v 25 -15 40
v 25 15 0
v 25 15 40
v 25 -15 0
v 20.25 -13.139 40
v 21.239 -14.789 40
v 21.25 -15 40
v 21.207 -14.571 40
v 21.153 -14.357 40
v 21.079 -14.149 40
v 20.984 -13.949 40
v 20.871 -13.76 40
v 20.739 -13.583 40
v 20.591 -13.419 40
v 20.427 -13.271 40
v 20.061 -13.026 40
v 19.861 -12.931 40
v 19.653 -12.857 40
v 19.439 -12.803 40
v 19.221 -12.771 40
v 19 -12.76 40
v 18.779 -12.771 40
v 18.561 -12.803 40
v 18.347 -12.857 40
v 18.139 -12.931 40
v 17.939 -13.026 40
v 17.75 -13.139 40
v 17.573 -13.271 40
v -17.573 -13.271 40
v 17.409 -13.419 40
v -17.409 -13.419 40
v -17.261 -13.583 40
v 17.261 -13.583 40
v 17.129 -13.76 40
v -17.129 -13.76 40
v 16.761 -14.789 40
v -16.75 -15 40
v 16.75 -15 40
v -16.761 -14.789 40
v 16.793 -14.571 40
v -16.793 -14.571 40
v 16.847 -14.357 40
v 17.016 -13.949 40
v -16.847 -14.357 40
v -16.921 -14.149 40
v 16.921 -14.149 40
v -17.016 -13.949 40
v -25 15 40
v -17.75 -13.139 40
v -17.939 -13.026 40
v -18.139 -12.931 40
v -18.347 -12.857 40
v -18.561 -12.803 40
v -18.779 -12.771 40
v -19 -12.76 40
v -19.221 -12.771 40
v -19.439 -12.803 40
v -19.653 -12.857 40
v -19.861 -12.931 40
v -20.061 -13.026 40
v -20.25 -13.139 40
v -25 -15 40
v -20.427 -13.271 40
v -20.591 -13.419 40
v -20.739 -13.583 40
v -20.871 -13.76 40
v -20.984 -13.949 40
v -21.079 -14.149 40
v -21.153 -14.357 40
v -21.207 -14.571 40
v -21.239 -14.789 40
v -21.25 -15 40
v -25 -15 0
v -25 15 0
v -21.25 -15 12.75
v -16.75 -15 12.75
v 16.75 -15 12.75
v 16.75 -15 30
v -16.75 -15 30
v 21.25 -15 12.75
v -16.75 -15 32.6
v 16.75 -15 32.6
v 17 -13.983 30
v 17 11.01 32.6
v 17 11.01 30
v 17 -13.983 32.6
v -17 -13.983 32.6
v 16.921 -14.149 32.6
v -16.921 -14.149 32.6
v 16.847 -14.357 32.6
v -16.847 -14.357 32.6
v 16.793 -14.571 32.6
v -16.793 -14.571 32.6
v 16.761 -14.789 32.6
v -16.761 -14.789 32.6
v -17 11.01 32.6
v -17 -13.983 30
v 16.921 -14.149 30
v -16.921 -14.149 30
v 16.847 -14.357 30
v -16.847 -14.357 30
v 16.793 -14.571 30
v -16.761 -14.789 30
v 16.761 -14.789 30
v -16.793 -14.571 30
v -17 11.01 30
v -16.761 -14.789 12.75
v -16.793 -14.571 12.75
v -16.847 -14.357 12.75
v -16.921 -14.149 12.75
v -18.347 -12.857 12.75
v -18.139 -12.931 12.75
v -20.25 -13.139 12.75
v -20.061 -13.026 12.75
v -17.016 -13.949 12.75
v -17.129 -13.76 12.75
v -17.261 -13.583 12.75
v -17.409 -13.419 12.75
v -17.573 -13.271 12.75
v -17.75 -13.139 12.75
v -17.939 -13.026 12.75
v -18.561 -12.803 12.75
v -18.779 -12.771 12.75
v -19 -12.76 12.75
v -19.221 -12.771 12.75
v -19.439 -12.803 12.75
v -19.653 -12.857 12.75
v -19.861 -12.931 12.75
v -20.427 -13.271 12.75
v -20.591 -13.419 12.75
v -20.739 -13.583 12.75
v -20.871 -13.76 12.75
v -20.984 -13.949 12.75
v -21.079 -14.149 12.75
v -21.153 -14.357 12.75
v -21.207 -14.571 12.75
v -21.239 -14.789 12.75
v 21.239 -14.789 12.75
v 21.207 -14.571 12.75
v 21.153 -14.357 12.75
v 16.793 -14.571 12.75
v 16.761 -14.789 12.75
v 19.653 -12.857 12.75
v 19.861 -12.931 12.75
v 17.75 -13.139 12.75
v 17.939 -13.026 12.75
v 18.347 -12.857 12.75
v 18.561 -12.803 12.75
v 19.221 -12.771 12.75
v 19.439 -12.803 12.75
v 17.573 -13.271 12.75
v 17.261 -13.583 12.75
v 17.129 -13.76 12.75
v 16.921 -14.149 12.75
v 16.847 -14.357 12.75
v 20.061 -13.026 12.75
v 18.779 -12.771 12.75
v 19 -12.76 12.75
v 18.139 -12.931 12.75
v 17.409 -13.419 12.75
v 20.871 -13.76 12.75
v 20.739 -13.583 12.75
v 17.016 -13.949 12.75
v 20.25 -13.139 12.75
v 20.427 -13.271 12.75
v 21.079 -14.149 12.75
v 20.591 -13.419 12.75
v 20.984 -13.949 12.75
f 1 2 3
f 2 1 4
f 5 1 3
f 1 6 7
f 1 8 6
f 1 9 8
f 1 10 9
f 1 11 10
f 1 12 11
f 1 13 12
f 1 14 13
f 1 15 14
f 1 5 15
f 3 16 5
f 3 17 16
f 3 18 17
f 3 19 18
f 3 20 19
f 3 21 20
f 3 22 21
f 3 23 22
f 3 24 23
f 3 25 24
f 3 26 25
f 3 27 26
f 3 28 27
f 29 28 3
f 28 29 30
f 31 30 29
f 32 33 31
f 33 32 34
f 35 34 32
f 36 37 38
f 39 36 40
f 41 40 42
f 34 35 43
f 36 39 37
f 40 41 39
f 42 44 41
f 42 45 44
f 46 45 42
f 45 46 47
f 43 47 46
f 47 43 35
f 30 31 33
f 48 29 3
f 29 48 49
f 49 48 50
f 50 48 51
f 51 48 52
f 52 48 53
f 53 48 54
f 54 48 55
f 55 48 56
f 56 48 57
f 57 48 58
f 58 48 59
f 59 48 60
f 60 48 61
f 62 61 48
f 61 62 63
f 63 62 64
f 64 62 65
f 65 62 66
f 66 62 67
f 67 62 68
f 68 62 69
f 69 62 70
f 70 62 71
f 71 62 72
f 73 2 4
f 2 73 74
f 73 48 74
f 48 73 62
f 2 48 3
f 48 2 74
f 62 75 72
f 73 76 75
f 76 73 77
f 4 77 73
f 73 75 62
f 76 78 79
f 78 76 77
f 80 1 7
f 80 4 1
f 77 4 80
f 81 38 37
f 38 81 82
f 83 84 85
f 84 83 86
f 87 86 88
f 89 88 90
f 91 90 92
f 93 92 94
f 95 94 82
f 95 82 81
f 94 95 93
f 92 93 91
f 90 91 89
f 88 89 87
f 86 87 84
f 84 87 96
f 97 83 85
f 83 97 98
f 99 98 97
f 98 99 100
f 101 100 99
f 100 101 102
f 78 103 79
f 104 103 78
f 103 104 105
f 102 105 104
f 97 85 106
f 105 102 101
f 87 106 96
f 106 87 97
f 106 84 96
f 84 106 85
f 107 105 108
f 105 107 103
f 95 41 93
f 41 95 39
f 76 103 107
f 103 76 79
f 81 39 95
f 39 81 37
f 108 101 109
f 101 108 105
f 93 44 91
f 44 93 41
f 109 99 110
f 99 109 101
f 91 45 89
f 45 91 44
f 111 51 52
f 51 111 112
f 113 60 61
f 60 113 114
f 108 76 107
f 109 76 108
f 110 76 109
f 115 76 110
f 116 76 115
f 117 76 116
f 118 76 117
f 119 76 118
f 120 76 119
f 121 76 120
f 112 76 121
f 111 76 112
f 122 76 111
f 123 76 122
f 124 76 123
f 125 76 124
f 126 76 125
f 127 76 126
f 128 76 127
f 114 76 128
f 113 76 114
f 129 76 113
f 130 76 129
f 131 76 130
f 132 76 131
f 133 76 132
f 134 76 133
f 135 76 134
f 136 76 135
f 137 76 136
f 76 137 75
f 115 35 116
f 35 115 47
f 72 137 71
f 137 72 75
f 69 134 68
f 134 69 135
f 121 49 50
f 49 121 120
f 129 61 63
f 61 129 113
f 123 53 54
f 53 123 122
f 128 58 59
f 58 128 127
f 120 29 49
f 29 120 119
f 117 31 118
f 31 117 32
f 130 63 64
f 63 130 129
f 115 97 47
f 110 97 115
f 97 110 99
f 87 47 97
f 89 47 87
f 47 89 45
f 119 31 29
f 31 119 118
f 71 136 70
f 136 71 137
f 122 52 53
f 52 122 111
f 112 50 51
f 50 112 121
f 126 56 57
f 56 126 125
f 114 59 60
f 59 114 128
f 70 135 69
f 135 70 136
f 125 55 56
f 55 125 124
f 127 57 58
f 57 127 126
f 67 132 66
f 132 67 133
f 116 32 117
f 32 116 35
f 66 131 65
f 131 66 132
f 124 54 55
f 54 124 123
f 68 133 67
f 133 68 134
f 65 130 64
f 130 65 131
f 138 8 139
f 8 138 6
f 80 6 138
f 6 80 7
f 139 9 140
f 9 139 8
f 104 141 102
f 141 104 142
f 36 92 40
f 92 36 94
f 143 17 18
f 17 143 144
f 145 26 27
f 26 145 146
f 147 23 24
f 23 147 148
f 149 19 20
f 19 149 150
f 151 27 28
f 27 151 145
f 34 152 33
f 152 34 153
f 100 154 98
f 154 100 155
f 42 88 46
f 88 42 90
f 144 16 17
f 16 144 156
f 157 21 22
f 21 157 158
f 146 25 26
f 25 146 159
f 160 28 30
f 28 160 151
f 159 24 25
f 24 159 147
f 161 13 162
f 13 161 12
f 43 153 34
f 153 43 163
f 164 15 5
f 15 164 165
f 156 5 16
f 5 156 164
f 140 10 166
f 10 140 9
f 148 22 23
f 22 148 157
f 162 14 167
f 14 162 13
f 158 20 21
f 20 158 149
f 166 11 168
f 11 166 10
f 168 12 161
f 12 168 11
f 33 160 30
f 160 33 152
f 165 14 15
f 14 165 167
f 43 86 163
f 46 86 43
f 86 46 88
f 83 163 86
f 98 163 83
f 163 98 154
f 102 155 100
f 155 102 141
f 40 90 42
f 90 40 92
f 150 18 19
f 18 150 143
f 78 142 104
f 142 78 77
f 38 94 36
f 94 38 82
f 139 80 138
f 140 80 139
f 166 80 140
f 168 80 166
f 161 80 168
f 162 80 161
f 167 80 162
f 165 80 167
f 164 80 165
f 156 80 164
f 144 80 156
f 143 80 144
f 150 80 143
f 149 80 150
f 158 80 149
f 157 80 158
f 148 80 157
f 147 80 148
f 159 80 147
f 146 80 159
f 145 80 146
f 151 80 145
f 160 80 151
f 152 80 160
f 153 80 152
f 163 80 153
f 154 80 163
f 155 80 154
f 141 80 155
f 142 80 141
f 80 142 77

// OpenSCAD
// --- Dimensions (mm) ---
block_width = 50;          // X dimension
block_depth = 30;          // Y dimension
block_height = 40;         // Z dimension

barrel_radius = 8.25;      // Half of 16.5mm channel width
flange_slot_width = 34;    // X dimension of slot
flange_slot_height = 2.6;  // Z dimension of slot
flange_slot_z_start = 30;  // Bottom of slot
flange_slot_z_end = 32.6;  // Top of slot
flange_slot_depth_end = 11; // Slot ends at y = 11 (relative to center 0,0)
                             // Note: If Y=11 is the end, and front is Y=-15, 
                             // the slot length is 11 - (-15) = 26mm.

screw_hole_diameter = 4.5; // M4 screw hole
screw_hole_x_offset = 19;  // X offset for screws
screw_hole_z_pos = 15;     // Z height for screws

// --- Constants ---
$fn = 64;

// --- Main Construction ---

// The part is centered on X and Y, resting on Z=0.
// Back face is at Y = 15, Front face is at Y = -15.

difference() {
    // 1. The Main Block
    // Positioned so Z=0 is the bottom, and X/Y are centered on 0.
    translate([-block_width/2, -block_depth/2, 0])
    cube([block_width, block_depth, block_height]);

    // 2. Barrel Channel
    // "back end is a half-circle of 8.25mm radius centred at x=0, y=0"
    // "straight sides run forward to the front face (y = -15)"
    // This means the curved part is at Y=0 and the channel extends to Y=-15.
    // To ensure a clean cut through the front face, we extend the cylinder slightly.
    translate([0, -15.01, 0])
    rotate([90, 0, 0])
    cylinder(h = 15.02, r = barrel_radius);

    // 3. Flange Slot
    // "34 mm wide (X, centred) and 2.6 mm tall (z = 30 to 32.6), 
    // cut in from the front face back to y = 11"
    // Front face is Y = -15. The slot goes from Y = -15 to Y = 11.
    // We use a small epsilon (0.01) to ensure the cut is clean.
    translate([-flange_slot_width/2, -15.01, flange_slot_z_start])
    cube([flange_slot_width, 11 - (-15.01) + 0.01, flange_slot_height]);

    // 4. Screw Holes
    // "Two 4.5 mm holes... go straight through from front to back (along Y) 
    // at x = -19 and 19, z = 15"
    // We extend the cylinder in Y to ensure it cuts through both faces.
    translate([-screw_hole_x_offset, -15.01, screw_hole_z_pos - (screw_hole_diameter/2)])
    cylinder(h = block_depth + 2, d = screw_hole_diameter);

    translate([screw_hole_x_offset, -15.01, screw_hole_z_pos - (screw_hole_diameter/2)])
    cylinder(h = block_depth + 2, d = screw_hole_diameter);
}
